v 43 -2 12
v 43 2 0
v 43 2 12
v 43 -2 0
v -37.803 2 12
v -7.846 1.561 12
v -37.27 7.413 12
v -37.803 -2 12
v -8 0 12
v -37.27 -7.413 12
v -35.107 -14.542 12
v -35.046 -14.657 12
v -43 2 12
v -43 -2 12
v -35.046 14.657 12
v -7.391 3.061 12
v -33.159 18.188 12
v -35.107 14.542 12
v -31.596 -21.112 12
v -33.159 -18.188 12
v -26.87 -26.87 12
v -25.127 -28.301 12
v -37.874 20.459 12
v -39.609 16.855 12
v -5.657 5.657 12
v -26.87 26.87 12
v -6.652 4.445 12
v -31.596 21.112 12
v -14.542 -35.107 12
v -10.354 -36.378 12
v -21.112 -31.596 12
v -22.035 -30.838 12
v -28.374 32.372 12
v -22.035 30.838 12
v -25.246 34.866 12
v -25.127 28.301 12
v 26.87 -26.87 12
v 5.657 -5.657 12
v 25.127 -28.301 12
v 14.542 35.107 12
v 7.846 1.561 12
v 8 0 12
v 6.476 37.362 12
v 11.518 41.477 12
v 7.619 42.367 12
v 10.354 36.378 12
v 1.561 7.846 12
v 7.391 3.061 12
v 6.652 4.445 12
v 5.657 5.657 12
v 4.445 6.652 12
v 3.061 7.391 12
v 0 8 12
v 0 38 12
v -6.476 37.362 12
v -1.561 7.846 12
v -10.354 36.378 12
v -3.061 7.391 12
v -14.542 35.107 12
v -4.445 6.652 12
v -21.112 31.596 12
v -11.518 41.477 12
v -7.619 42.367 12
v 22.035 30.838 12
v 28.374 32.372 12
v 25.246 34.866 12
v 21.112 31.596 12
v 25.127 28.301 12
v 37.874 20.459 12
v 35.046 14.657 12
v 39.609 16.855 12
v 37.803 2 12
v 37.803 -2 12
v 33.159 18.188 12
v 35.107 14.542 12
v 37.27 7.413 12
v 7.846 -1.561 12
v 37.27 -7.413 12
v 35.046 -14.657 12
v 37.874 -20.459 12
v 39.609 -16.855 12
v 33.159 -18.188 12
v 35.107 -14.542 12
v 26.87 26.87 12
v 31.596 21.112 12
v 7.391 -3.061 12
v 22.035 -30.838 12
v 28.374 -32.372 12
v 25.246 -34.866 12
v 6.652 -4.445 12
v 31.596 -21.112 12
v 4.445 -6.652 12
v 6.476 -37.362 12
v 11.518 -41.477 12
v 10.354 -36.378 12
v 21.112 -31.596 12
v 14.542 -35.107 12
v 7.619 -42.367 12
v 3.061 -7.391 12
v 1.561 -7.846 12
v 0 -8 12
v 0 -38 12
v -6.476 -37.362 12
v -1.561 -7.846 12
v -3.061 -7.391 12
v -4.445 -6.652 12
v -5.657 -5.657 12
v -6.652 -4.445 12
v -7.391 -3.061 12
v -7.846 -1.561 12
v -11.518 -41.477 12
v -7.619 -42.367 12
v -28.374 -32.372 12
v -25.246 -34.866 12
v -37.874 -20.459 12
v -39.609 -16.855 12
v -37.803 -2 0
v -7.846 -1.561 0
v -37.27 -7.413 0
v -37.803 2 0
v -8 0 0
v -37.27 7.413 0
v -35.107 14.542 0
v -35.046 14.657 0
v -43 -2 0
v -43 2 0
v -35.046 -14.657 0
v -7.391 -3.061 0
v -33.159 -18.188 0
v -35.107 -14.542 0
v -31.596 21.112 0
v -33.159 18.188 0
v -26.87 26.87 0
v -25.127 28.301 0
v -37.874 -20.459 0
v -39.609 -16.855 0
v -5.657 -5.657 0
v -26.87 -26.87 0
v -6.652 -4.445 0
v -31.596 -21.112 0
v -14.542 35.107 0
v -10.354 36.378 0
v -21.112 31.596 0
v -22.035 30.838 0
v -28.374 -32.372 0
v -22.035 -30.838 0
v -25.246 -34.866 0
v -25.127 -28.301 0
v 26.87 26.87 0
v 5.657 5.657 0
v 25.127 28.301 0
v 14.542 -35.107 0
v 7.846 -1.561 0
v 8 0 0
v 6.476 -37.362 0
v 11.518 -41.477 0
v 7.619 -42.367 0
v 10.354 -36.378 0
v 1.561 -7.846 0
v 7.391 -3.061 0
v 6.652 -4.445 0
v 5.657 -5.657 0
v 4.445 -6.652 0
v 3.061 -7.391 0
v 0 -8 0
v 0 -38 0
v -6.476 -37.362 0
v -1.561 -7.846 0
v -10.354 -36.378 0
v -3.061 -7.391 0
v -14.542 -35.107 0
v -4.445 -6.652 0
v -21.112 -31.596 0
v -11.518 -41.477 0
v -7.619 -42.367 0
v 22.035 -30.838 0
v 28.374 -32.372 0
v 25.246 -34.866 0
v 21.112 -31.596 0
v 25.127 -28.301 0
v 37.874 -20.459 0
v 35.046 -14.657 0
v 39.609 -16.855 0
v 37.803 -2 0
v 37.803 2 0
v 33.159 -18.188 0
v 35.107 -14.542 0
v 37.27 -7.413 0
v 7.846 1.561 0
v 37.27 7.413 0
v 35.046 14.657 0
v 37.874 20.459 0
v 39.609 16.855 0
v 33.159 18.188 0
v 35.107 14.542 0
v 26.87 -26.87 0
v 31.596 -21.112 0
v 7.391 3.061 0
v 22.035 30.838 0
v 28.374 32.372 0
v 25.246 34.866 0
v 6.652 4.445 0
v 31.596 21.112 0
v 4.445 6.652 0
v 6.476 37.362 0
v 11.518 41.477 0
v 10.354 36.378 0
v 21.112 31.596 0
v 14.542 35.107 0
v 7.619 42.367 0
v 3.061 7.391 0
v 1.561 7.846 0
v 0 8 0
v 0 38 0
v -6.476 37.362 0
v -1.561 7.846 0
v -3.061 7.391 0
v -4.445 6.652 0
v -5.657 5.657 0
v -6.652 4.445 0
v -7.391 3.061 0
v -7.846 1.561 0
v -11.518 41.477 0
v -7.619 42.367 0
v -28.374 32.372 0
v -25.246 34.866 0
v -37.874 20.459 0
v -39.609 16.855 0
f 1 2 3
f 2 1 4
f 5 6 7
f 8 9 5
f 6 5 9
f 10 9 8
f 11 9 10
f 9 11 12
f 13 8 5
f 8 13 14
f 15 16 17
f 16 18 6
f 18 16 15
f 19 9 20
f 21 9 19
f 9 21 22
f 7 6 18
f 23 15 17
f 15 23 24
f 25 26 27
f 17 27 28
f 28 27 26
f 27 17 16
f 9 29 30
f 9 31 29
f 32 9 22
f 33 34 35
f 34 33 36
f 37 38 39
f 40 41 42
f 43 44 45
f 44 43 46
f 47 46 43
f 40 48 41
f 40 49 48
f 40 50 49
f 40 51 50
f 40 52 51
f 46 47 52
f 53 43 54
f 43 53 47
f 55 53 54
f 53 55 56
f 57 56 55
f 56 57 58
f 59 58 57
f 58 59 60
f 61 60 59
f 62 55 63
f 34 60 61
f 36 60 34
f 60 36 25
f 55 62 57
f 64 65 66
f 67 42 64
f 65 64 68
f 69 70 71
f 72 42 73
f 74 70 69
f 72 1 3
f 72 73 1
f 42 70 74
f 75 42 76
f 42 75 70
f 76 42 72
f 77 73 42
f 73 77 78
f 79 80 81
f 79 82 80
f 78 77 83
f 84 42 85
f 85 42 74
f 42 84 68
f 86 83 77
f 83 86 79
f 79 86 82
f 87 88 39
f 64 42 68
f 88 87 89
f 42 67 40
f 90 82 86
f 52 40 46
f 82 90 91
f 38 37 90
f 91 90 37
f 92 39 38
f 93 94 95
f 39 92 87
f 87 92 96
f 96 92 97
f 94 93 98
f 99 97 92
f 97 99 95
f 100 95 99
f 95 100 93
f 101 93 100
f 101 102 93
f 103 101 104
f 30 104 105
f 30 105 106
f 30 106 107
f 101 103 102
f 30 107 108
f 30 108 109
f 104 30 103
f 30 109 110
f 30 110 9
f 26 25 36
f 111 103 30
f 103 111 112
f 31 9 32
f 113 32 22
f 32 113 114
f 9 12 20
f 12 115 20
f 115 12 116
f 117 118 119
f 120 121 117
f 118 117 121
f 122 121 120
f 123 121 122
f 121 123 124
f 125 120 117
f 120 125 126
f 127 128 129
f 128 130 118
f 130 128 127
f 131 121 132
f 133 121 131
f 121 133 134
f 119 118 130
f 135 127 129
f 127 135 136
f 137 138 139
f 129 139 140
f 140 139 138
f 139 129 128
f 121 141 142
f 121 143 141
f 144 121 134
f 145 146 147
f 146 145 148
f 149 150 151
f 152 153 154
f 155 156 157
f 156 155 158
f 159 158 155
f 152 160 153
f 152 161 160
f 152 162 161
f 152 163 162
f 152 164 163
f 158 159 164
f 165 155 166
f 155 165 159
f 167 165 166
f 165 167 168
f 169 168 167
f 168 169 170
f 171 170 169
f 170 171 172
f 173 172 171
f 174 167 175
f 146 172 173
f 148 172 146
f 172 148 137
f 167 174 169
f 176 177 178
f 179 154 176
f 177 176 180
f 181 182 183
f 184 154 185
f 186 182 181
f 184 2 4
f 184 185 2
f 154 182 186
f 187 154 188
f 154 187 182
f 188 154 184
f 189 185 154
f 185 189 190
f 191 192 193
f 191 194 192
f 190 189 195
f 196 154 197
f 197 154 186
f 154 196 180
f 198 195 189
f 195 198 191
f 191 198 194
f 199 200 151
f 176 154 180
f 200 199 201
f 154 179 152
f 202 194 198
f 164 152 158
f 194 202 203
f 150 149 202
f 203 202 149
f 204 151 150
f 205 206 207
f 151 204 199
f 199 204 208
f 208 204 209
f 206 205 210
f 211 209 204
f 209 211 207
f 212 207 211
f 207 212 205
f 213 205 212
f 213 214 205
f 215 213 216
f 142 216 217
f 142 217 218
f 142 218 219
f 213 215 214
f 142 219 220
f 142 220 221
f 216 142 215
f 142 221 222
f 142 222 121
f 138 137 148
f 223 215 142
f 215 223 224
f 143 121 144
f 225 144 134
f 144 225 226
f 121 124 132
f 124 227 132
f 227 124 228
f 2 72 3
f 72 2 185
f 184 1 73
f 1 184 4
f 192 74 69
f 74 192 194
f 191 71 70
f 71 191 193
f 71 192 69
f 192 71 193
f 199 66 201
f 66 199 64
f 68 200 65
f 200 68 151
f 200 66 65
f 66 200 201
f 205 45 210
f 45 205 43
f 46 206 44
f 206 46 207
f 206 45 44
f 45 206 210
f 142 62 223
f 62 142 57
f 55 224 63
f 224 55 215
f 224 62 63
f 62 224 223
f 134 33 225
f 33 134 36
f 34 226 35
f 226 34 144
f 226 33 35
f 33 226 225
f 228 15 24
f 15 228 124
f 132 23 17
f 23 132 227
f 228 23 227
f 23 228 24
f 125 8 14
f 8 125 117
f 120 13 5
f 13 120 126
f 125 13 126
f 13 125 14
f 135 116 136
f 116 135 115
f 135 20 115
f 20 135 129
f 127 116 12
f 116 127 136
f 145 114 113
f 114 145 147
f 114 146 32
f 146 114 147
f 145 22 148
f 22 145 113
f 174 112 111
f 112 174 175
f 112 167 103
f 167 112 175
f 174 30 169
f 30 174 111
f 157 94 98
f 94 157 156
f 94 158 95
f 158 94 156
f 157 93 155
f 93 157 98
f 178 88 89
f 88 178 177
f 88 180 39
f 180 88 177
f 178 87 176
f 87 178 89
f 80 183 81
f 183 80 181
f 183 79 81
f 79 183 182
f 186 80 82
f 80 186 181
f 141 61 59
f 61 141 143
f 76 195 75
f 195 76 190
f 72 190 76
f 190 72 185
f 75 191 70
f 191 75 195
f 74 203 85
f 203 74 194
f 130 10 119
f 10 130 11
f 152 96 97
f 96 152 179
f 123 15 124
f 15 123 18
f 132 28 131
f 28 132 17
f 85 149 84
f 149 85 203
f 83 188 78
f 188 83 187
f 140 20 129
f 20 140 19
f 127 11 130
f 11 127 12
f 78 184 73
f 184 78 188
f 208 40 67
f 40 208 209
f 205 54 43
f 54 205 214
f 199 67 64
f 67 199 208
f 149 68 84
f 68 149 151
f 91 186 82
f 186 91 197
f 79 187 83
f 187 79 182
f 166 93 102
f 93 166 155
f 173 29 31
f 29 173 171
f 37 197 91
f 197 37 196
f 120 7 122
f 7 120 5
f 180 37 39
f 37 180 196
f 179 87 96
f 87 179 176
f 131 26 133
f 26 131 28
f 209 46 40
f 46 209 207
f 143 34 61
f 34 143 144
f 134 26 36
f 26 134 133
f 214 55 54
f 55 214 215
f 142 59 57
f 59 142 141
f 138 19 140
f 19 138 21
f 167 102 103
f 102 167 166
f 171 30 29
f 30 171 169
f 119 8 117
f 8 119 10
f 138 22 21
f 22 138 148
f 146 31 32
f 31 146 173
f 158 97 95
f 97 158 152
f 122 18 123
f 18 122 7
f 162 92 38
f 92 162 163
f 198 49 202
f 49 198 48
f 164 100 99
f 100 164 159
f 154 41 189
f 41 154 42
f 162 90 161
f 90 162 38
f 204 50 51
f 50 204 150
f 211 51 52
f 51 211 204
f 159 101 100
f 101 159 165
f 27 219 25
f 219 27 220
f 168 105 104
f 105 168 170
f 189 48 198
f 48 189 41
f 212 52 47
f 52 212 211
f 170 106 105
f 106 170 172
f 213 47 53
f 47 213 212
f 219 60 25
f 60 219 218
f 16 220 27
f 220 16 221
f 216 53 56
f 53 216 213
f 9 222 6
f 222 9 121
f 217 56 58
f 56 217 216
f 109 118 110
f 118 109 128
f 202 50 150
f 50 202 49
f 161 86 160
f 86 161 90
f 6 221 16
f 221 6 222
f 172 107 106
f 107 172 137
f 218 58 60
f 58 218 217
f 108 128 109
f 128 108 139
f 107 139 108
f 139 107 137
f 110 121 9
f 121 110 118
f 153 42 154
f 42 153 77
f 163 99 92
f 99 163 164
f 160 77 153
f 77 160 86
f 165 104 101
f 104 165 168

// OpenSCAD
$fn = 32;

// ----------------------------------------------------------------------
// Spur blank: bored gear blank
// ----------------------------------------------------------------------

// --- parameters (mm) ---
disc_r = 38;              // blank root radius
disc_t = 12;              // blank thickness
n_teeth = 14;             // stub tooth count
tooth_w = 4;              // tooth width at the root
tooth_h = 5;              // tooth height above the root
bore_r = 8;               // central bore radius

out_r = disc_r + tooth_h;  // tip radius
bbox_x = 86.0;  // measured width over the teeth
bbox_y = 84.73;  // measured depth over the teeth

difference() {
union() {
  cylinder(r = disc_r, h = disc_t);
  for (i = [0 : n_teeth - 1])
    rotate([0, 0, i * 360 / n_teeth])
      translate([disc_r - 1, -tooth_w / 2, 0])
        cube([tooth_h + 1, tooth_w, disc_t]);
}
  translate([0, 0, -1]) cylinder(r = bore_r, h = disc_t + 2);
}
